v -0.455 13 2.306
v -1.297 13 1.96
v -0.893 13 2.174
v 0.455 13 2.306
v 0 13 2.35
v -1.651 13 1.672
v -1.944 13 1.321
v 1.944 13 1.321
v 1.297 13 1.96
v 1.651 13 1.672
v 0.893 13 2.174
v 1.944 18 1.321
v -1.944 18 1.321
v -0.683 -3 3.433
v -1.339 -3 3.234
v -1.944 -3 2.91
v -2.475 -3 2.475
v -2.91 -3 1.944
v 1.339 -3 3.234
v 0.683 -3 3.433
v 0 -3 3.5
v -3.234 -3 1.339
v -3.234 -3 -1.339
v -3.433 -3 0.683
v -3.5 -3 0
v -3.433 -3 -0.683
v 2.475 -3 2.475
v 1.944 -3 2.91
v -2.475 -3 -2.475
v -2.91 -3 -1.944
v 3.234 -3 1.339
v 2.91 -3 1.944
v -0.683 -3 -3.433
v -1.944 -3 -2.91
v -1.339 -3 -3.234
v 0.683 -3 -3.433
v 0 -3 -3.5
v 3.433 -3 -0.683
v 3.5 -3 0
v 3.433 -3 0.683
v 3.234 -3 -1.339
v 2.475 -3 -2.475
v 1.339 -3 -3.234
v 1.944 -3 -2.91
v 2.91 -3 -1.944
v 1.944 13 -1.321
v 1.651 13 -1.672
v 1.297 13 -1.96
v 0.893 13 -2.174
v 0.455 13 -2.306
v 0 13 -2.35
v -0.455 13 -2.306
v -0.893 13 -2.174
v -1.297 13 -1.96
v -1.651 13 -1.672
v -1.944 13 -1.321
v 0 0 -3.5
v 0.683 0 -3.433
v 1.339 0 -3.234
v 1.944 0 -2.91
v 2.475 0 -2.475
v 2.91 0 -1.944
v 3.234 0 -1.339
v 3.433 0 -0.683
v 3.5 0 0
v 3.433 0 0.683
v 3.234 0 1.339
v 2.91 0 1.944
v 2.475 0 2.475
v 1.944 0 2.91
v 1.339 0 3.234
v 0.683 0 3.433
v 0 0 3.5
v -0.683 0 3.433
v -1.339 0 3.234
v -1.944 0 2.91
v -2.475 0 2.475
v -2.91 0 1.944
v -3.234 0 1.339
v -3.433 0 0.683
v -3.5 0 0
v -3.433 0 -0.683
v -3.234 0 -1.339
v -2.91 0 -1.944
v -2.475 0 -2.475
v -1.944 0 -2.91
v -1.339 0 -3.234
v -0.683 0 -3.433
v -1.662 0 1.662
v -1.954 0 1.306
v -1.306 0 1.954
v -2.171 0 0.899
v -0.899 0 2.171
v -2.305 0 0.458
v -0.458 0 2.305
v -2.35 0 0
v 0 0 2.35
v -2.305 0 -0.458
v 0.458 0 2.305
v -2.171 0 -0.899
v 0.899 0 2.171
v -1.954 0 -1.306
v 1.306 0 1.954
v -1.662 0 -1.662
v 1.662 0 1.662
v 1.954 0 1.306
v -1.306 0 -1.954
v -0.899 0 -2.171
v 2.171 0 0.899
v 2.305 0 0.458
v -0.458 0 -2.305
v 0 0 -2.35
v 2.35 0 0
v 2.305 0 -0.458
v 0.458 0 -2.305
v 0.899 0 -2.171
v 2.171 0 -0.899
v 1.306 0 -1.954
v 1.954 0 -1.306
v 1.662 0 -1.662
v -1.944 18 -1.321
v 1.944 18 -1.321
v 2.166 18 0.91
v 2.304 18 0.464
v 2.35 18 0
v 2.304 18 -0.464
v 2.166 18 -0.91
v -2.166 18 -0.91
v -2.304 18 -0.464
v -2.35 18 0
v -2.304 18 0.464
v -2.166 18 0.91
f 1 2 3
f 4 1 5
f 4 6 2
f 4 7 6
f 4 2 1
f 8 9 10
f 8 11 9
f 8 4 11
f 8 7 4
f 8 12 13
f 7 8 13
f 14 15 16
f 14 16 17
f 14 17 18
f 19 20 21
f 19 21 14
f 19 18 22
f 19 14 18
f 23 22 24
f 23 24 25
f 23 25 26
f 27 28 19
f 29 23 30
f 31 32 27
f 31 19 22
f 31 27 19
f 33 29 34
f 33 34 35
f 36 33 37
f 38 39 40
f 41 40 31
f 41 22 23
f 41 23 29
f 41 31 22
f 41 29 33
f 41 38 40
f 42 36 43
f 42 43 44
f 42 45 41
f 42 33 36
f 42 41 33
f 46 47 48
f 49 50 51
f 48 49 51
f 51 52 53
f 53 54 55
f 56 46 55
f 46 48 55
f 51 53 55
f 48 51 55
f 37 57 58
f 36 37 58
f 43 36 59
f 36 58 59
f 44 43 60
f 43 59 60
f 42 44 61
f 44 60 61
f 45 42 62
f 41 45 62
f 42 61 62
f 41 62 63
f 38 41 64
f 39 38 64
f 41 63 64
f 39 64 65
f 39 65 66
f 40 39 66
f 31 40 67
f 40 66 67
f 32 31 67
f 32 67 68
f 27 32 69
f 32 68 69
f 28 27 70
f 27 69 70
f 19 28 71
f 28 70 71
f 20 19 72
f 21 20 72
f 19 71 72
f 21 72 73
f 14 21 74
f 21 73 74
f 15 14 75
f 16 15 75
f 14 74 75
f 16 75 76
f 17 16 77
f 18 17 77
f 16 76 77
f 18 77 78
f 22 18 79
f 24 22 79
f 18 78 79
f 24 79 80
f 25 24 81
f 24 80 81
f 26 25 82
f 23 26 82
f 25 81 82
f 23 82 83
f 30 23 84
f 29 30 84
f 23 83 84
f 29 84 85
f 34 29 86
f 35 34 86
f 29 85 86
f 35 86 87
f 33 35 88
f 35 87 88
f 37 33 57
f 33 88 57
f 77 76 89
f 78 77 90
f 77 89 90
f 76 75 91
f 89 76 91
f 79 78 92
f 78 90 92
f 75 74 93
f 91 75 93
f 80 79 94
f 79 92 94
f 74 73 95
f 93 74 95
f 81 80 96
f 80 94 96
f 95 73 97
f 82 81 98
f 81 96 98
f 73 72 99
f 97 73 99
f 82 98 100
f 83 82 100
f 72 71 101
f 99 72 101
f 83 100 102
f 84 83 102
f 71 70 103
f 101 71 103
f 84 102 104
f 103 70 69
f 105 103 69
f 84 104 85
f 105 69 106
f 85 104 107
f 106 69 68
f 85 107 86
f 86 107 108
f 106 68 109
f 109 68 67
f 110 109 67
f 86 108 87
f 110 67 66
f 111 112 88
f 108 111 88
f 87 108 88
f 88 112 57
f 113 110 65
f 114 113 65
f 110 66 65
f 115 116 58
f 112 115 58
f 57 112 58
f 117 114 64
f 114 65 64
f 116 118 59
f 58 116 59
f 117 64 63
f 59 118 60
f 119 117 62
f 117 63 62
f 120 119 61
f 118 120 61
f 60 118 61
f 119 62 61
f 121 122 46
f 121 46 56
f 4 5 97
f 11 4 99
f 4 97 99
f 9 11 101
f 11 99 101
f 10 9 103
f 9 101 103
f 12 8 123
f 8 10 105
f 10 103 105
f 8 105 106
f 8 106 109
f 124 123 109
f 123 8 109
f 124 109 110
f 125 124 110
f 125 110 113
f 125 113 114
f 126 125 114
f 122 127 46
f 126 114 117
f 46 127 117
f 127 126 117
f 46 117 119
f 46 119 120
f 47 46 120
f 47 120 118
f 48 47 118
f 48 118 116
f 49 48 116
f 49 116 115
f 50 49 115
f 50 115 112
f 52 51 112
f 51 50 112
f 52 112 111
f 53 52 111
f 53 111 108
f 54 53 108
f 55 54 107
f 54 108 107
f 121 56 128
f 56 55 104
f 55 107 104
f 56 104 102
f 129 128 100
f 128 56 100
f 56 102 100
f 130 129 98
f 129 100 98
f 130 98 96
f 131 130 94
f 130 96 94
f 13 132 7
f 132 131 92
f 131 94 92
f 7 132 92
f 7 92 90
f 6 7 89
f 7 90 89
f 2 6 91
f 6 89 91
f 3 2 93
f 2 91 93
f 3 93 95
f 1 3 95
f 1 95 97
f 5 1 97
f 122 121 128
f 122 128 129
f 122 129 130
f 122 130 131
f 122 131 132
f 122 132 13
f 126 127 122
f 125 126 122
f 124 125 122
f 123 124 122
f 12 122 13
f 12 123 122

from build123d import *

# Parameters (mm, degrees)
SKETCH_1_R          = 2.35
EXTRUDE_1_DEPTH     = 18
SKETCH_3_R          = 3.5
EXTRUDE_2_DEPTH     = 3
CUT_EXTRUDE_2_DEPTH = 5


with BuildPart() as part:
    # 스케치1 → 보스-돌출1 (new body)
    with BuildSketch(Plane(origin=(0, 0, 0), x_dir=(1, 0, 0), z_dir=(0, 1, 0))):
        with Locations(Location((0, 0, 0), (0, 0, 270))):
            Circle(SKETCH_1_R)
    extrude(amount=EXTRUDE_1_DEPTH)

    # 스케치3 → 보스-돌출2 (add)
    with BuildSketch(Plane(origin=(0, 0, 0), x_dir=(-1, 0, 0), z_dir=(0, -1, 0))):
        with Locations(Location((0, 0, 0), (0, 0, 90))):
            Circle(SKETCH_3_R)
    extrude(amount=EXTRUDE_2_DEPTH)

    # 스케치6 → 컷-돌출2 (cut)
    with BuildSketch(Plane(origin=(0, 18, 0), x_dir=(1, 0, 0), z_dir=(0, 1, 0))):
        Polygon((1.99637355, 1.320619816), (-1.996753764, 1.320619816), (-2.00362645, 2.467115277), (1.99637355, 2.467115277), align=None)
        Polygon((1.99637355, -2.467115277), (1.99637355, -1.320619816), (-1.996753764, -1.320619816), (-2.00362645, -2.467115277), align=None)
    extrude(amount=-CUT_EXTRUDE_2_DEPTH, mode=Mode.SUBTRACT)


solid = part.part
